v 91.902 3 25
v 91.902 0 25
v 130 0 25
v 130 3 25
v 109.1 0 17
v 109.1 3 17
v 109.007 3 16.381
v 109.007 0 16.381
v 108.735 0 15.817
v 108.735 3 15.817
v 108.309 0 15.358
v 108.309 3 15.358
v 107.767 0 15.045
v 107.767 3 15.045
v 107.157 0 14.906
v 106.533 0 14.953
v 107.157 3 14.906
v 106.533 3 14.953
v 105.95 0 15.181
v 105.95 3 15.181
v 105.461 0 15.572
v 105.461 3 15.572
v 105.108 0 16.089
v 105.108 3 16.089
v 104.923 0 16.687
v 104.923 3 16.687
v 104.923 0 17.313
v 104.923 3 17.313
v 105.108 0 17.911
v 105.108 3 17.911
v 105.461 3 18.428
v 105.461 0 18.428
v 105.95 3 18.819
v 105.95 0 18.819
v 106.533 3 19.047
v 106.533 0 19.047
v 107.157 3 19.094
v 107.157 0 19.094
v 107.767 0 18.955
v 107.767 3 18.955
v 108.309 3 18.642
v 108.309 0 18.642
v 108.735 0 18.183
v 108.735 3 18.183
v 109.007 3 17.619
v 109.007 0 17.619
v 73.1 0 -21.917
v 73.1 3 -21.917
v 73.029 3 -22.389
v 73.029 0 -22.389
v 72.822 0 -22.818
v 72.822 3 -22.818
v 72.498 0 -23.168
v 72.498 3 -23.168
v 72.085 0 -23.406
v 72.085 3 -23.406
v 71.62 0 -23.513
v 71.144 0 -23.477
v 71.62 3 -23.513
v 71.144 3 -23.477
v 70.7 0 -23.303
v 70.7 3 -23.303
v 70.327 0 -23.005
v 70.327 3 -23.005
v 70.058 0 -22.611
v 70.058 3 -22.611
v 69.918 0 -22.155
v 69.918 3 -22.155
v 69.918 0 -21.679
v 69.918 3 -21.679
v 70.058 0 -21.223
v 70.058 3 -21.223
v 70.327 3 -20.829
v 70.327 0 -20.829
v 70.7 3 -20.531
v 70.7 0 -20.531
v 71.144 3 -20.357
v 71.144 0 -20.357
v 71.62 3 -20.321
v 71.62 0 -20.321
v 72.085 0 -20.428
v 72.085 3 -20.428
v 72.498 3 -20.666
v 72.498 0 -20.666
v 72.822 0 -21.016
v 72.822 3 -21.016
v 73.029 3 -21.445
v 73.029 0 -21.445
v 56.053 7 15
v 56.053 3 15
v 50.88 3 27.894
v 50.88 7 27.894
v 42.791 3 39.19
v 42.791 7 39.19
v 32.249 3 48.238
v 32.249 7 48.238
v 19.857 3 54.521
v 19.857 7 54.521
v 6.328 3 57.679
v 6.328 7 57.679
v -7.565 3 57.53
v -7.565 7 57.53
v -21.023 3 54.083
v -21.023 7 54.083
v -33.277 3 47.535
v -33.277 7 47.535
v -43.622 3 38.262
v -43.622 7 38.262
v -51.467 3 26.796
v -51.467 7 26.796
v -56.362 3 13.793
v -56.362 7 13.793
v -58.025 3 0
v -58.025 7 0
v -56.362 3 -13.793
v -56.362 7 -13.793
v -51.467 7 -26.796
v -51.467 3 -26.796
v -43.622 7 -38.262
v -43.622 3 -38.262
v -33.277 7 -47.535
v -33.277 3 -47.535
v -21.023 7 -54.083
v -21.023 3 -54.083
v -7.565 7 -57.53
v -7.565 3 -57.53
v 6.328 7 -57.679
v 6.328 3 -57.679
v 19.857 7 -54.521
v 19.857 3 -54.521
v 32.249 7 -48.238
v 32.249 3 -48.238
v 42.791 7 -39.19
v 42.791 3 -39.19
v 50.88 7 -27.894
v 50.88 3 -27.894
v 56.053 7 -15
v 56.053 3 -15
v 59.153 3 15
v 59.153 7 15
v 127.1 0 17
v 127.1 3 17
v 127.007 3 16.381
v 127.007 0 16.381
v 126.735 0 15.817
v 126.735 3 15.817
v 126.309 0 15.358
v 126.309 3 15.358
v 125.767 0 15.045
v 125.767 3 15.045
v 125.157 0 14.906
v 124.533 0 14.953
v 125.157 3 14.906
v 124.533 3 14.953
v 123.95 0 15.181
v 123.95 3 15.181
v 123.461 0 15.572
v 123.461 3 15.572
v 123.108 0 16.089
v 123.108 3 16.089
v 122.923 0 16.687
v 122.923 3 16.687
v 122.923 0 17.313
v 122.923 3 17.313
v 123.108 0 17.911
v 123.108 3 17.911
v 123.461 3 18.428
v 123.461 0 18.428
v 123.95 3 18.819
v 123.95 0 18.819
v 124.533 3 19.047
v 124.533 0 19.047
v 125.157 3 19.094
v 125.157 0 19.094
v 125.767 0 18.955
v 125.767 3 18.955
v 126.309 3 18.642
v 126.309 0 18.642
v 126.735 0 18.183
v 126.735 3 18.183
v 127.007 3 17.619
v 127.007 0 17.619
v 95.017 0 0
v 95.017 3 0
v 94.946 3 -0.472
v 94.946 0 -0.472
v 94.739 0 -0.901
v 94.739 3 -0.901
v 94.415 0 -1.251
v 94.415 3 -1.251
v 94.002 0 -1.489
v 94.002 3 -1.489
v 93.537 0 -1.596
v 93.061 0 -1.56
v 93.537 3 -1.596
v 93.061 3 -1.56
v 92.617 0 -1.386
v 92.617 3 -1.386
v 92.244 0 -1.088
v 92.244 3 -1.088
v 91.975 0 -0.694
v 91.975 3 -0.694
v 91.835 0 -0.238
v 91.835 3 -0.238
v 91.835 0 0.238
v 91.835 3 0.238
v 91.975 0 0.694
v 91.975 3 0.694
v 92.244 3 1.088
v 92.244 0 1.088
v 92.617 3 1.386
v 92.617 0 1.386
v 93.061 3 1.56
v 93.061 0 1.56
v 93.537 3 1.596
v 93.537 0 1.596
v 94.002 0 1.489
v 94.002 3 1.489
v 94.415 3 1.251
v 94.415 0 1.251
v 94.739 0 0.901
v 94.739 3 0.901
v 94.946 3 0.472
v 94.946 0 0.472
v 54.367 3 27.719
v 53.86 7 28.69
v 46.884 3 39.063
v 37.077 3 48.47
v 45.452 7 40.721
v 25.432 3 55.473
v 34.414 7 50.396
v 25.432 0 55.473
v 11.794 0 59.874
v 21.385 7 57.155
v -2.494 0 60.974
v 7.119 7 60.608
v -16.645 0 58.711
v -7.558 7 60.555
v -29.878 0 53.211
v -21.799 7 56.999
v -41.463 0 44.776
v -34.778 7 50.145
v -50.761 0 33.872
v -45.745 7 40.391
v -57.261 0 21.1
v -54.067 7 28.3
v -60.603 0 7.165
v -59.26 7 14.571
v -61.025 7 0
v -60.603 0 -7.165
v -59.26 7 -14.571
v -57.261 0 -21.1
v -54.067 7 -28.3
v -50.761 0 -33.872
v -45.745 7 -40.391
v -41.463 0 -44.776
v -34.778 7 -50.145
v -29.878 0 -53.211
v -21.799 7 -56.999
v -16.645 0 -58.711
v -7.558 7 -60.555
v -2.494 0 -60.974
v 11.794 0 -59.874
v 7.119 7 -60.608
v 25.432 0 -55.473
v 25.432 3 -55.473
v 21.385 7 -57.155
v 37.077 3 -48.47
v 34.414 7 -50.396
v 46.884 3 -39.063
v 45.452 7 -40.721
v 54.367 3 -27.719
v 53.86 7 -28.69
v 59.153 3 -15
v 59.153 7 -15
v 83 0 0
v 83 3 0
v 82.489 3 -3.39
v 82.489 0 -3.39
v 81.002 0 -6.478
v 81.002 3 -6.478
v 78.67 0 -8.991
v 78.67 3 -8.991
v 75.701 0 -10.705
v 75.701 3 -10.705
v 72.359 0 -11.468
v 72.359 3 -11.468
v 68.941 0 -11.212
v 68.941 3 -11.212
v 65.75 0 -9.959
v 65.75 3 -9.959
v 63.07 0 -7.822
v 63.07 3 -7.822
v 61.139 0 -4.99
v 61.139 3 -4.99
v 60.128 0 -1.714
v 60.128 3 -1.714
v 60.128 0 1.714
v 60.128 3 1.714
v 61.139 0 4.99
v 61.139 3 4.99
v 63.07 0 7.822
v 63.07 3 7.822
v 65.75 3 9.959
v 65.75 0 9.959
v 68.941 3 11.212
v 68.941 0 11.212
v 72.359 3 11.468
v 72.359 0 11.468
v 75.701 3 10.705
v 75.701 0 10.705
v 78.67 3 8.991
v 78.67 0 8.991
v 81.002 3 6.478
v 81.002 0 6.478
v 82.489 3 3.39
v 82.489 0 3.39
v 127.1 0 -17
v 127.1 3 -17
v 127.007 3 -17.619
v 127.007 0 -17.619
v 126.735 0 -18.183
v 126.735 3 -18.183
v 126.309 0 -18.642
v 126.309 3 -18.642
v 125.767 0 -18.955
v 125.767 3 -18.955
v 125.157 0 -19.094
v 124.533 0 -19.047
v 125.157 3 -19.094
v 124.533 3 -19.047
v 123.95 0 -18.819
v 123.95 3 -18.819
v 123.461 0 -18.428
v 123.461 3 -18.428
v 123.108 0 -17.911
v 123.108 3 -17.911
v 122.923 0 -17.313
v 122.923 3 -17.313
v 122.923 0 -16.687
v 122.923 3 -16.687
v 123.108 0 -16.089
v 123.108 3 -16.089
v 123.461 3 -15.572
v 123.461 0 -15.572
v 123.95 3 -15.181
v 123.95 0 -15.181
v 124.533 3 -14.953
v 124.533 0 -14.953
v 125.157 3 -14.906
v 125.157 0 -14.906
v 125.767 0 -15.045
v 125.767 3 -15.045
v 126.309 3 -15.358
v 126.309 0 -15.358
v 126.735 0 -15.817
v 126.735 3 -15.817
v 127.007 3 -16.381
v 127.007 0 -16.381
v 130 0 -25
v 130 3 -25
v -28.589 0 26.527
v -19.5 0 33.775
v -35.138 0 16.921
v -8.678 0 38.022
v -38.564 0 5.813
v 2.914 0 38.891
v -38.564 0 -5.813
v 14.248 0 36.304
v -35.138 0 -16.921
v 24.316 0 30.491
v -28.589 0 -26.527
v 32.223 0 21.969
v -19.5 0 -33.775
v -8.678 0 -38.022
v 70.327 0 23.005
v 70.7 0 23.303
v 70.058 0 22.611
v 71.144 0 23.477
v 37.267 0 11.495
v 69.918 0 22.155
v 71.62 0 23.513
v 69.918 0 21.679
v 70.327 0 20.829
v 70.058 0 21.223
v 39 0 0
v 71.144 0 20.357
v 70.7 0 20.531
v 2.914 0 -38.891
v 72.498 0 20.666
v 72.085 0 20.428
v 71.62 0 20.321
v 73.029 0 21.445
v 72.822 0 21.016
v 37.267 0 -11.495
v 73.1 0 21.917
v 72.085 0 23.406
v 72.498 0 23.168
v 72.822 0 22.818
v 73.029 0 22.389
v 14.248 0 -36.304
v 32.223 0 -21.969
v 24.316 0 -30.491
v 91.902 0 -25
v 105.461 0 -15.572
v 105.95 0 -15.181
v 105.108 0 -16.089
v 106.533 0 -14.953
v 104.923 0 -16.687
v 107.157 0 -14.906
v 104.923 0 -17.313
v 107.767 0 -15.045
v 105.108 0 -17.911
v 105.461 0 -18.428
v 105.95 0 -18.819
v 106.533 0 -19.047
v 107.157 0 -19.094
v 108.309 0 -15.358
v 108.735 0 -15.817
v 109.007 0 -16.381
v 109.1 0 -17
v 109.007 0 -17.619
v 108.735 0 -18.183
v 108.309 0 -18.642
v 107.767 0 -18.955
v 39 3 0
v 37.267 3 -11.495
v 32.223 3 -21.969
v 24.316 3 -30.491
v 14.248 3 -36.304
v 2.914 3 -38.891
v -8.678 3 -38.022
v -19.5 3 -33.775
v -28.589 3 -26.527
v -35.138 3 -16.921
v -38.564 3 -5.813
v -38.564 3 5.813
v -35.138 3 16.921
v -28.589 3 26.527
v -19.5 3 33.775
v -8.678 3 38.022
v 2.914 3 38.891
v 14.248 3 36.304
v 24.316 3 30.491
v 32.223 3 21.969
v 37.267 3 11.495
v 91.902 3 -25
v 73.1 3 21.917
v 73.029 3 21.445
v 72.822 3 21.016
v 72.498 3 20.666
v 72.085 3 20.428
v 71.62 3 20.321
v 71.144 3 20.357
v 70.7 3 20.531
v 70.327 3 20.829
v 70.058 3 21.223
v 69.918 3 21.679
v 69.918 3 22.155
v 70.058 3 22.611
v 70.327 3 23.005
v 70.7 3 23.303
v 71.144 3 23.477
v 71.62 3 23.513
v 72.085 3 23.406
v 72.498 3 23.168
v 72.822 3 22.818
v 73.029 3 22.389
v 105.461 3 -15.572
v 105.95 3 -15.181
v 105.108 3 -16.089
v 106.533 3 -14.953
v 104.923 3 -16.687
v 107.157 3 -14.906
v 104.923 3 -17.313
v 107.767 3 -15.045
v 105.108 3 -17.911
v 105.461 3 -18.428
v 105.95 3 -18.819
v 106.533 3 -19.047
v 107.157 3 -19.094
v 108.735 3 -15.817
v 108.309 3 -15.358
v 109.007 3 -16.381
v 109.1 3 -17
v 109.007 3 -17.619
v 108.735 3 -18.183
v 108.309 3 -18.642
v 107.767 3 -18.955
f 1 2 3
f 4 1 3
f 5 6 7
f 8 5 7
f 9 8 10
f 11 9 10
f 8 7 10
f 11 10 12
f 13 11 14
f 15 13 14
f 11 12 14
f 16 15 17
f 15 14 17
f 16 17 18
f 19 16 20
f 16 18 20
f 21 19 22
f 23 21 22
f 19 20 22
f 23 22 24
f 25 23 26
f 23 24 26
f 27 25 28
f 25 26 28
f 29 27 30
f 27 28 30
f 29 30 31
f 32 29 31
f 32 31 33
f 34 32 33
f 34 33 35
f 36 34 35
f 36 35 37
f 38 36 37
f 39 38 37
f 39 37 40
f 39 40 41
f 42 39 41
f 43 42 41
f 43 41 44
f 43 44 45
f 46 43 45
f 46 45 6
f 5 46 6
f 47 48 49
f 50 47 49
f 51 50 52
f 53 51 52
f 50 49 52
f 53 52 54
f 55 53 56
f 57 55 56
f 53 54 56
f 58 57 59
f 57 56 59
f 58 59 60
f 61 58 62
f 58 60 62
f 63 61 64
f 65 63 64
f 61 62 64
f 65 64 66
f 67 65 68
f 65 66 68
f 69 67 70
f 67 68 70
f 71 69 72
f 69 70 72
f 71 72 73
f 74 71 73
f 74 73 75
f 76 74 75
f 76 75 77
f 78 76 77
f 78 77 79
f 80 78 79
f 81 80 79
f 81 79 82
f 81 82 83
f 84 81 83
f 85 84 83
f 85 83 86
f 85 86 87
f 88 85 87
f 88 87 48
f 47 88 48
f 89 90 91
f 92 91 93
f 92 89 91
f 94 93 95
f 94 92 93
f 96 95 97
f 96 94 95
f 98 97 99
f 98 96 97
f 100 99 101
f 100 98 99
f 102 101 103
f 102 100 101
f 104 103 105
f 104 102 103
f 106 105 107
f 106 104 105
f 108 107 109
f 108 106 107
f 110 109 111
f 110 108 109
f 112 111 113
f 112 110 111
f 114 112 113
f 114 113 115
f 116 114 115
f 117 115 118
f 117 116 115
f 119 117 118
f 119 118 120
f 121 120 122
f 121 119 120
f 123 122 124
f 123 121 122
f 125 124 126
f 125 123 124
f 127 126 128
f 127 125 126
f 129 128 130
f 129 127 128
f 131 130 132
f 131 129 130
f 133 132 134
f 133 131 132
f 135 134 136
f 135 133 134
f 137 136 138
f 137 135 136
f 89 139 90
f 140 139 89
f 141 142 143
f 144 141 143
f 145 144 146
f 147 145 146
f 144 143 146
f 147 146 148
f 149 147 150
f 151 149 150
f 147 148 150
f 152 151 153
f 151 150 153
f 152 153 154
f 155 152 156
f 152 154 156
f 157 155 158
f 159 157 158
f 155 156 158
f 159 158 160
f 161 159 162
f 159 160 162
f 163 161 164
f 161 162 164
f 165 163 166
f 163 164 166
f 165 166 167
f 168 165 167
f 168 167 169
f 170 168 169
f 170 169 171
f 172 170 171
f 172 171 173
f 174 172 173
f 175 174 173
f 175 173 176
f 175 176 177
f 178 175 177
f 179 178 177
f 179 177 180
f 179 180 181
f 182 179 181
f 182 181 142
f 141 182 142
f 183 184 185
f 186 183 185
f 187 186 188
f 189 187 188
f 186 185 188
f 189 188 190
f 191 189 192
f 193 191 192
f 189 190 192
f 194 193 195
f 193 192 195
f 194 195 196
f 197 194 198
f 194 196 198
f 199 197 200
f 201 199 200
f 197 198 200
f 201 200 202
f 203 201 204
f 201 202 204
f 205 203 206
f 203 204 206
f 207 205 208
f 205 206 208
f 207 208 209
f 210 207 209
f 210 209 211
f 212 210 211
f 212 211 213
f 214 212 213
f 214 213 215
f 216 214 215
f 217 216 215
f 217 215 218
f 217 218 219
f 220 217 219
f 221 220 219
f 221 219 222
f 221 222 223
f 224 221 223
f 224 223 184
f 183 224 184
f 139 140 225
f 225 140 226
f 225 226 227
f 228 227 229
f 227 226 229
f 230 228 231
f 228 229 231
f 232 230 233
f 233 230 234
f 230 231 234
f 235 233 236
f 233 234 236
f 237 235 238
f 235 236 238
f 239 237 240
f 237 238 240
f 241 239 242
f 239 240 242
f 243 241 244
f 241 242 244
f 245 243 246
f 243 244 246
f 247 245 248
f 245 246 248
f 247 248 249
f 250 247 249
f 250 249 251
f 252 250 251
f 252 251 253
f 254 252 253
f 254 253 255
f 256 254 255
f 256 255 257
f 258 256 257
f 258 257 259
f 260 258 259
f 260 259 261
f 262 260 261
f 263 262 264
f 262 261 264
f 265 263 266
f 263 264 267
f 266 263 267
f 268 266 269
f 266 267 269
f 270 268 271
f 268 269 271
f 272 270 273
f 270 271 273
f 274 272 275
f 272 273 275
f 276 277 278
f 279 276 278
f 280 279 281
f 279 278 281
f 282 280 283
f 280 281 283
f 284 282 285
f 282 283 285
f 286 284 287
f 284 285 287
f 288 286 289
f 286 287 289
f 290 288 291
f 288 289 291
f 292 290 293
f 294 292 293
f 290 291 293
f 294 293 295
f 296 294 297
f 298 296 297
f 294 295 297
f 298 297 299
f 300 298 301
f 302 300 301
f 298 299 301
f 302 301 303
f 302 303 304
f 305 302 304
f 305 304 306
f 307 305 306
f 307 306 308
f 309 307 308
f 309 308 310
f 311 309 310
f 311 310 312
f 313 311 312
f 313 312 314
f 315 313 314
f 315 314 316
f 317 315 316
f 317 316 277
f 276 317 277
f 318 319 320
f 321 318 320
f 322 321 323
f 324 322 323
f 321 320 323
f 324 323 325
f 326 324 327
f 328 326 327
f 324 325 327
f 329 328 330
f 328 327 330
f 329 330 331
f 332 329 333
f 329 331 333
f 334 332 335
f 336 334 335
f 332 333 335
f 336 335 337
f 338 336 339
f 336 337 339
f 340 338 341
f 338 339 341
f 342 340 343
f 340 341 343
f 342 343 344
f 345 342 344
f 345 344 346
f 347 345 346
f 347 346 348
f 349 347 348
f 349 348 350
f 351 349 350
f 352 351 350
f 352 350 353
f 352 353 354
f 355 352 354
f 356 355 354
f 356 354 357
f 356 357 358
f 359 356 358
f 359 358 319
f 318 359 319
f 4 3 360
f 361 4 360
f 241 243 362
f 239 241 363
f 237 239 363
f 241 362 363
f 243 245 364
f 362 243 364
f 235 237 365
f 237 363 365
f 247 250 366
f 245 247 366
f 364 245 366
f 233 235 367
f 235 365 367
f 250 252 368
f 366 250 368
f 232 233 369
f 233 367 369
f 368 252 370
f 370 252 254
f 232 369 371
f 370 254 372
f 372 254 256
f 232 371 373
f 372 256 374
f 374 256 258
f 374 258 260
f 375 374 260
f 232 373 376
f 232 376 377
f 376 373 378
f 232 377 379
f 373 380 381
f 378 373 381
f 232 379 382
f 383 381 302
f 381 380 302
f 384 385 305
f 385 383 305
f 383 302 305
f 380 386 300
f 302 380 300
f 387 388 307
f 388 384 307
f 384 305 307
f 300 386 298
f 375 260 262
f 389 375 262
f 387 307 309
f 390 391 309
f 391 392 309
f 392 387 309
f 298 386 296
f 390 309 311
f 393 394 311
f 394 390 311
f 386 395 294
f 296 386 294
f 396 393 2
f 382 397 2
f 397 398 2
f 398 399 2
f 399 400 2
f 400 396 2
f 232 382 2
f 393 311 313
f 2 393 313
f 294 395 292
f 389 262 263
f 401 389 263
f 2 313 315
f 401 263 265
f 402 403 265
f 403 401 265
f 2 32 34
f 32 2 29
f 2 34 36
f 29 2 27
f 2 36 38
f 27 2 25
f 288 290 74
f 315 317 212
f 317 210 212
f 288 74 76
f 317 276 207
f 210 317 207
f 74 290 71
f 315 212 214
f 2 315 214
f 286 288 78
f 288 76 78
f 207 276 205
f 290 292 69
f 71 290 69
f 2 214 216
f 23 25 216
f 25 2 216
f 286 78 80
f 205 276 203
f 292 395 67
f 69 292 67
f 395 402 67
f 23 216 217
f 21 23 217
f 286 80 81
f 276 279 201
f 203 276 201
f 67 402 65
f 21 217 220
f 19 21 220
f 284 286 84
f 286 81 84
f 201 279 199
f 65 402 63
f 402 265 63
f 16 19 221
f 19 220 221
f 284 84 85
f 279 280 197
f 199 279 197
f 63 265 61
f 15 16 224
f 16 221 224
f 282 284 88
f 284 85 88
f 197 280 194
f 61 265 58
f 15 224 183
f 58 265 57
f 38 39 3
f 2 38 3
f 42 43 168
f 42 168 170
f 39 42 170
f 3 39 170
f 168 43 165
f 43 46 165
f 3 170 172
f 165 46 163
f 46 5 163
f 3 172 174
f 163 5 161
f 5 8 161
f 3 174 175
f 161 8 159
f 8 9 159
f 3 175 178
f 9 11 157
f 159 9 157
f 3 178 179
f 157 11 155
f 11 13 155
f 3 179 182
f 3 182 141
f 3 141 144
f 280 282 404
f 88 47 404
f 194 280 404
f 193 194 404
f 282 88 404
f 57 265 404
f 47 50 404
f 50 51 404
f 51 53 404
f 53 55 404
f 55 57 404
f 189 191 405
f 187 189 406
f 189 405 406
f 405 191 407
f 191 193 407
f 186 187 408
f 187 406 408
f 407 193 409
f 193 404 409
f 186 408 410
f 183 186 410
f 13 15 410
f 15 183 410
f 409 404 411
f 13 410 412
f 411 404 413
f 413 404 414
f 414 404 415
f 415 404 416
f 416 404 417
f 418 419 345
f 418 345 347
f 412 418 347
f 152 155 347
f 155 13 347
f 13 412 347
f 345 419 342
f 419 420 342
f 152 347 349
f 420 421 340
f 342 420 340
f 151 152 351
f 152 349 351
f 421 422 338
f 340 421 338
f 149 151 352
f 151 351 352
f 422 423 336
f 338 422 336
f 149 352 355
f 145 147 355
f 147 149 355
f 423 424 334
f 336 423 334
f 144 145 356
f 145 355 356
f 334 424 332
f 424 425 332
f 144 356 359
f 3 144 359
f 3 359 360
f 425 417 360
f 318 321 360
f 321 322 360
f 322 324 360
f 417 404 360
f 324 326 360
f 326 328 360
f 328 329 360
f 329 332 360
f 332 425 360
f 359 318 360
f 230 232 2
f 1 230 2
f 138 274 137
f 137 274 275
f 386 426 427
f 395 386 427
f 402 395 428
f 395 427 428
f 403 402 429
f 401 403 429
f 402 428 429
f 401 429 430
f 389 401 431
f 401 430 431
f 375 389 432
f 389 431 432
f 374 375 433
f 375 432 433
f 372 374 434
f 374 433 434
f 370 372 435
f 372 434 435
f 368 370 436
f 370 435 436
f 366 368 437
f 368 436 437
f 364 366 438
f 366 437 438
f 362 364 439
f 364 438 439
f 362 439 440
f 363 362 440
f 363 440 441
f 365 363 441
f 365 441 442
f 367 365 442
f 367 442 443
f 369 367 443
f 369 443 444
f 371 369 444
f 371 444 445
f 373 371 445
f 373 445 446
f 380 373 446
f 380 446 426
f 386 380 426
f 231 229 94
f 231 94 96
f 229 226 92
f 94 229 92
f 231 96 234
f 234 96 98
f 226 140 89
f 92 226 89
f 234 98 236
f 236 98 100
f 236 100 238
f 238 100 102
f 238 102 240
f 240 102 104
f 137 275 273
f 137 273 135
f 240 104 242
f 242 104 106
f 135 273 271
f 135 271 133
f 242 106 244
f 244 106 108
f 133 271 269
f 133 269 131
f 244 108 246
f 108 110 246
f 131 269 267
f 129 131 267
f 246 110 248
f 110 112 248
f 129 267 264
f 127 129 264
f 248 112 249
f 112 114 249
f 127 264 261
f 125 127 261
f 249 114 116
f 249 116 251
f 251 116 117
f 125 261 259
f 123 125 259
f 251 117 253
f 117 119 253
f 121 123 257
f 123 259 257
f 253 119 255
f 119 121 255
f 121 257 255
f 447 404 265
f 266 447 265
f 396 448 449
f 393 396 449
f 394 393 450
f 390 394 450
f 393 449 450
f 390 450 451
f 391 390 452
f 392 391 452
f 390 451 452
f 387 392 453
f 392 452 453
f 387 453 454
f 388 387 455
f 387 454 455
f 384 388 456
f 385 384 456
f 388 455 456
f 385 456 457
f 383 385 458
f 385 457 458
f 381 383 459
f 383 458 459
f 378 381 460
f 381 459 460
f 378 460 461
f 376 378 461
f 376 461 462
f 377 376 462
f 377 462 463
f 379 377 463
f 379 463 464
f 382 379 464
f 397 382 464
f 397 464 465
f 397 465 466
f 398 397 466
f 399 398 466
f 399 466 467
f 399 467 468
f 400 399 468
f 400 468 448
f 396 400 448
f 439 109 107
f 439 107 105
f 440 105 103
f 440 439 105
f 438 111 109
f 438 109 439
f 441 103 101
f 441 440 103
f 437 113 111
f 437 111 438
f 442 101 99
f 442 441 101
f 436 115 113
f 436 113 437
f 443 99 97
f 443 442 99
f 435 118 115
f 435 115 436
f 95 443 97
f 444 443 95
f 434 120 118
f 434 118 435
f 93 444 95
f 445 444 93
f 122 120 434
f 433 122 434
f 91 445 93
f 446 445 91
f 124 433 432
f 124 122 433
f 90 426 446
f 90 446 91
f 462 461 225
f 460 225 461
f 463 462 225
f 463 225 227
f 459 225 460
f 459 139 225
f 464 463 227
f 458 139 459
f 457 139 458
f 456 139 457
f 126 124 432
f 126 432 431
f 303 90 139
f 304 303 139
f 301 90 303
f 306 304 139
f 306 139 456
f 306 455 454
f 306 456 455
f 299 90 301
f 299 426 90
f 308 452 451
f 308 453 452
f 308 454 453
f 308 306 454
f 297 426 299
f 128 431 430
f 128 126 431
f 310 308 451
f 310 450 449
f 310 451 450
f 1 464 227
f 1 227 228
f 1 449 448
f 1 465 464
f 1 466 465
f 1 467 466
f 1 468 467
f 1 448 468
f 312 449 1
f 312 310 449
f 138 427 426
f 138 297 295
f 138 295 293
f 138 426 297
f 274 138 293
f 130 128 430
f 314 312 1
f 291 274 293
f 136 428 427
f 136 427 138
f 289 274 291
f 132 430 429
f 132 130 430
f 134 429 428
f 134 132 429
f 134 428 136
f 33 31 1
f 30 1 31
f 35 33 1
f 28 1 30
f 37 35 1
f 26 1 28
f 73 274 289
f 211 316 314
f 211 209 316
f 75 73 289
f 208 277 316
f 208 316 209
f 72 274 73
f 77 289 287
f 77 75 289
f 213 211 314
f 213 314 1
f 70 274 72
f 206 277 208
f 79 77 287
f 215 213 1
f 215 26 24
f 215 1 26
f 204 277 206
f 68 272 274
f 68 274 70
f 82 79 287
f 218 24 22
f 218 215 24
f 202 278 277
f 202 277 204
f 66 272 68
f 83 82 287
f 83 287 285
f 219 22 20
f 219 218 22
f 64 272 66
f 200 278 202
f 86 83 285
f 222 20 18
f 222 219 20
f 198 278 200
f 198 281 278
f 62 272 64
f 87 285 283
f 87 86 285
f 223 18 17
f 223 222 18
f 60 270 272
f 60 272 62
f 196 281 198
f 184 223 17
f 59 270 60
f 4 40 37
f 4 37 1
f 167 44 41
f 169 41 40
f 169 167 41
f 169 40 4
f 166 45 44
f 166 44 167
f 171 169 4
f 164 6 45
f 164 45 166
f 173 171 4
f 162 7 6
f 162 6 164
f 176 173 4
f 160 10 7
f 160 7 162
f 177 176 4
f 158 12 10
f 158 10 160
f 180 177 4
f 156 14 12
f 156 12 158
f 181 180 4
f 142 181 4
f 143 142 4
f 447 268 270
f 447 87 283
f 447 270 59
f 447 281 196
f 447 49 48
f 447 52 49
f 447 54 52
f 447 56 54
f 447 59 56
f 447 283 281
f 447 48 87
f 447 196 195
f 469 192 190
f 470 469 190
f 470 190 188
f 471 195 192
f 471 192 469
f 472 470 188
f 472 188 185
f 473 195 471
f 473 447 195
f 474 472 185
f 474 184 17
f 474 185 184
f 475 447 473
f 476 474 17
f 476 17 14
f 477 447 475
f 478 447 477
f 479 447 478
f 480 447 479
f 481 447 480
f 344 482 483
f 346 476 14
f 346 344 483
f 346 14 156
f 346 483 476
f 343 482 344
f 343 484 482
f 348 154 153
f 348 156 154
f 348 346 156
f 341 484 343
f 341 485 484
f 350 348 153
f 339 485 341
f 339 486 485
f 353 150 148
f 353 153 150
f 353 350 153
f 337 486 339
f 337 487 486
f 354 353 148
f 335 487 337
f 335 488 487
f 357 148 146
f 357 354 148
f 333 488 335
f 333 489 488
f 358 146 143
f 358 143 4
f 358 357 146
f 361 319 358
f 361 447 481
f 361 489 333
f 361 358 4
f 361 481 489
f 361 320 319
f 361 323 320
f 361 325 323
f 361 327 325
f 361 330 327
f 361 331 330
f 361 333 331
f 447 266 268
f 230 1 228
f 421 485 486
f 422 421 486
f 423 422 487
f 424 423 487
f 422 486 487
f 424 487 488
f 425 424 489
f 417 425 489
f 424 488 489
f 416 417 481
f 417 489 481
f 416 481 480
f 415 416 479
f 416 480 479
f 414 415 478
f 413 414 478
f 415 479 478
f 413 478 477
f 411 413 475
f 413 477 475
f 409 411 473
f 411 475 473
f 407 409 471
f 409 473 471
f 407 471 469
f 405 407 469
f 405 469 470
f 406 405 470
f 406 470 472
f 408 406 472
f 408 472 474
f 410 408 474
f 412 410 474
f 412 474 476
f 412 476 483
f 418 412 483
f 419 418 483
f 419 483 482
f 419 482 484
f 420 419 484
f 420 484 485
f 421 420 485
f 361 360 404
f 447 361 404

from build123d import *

# Parameters (mm, degrees)
EXTRUDE_3_DEPTH     = 3
SKETCH_3_R          = 11.5
SKETCH_3_R_2        = 39
SKETCH_3_R_3        = 1.6
SKETCH_3_R_4        = 2.1
CUT_EXTRUDE_1_DEPTH = 4
SKETCH_4_W          = 3
SKETCH_4_H          = 4
SKETCH_6_W          = 30
SKETCH_6_H          = 10
CUT_EXTRUDE_3_DEPTH = 10


with BuildPart() as part:
    # 草图2 → 凸台-拉伸3 (new body)
    with BuildSketch(Plane(origin=(0, 0, 0), x_dir=(1, 0, 0), z_dir=(0, 1, 0))):
        with BuildLine():
            Line((91.901888805, 25), (25.431682676, 55.473238064))
            ThreePointArc((25.431682676, 55.473238064), (-61.025, 0), (25.431682676, -55.473238064))
            Line((25.431682676, -55.473238064), (91.901888805, -25))
            Line((91.901888805, -25), (130, -25))
            Line((130, -25), (130, 25))
            Line((130, 25), (91.901888805, 25))
        make_face()
    extrude(amount=EXTRUDE_3_DEPTH)

    # 草图3 → 切除-拉伸1 (cut, through all)
    with BuildSketch(Plane(origin=(0, 3, 0), x_dir=(1, 0, 0), z_dir=(0, 1, 0))):
        with Locations((71.5, 0)):
            Circle(SKETCH_3_R)
        Circle(SKETCH_3_R_2)
        with Locations((71.5, 21.917)):
            Circle(SKETCH_3_R_3)
        with Locations((93.417, 0)):
            Circle(SKETCH_3_R_3)
        with Locations((71.5, -21.917)):
            Circle(SKETCH_3_R_3)
        with Locations((125, 17)):
            Circle(SKETCH_3_R_4)
        with Locations((107, 17)):
            Circle(SKETCH_3_R_4)
        with Locations((125, -17)):
            Circle(SKETCH_3_R_4)
        with Locations((107, -17)):
            Circle(SKETCH_3_R_4)
    extrude(amount=-CUT_EXTRUDE_1_DEPTH, mode=Mode.SUBTRACT)

    # 草图4 → 旋转1 (revolve)
    with BuildSketch(Plane.XY):
        with Locations((-59.525, 5)):
            Rectangle(SKETCH_4_W, SKETCH_4_H)
    revolve(axis=Axis((0, 38.176517008, 0), (0, -1, 0)))

    # 草图6 → 切除-拉伸3 (cut)
    with BuildSketch(Plane(origin=(61.025, 0, 0), x_dir=(0, 0, -1), z_dir=(1, 0, 0))):
        with Locations((0, 8)):
            Rectangle(SKETCH_6_W, SKETCH_6_H)
    extrude(amount=-CUT_EXTRUDE_3_DEPTH, mode=Mode.SUBTRACT)


solid = part.part
